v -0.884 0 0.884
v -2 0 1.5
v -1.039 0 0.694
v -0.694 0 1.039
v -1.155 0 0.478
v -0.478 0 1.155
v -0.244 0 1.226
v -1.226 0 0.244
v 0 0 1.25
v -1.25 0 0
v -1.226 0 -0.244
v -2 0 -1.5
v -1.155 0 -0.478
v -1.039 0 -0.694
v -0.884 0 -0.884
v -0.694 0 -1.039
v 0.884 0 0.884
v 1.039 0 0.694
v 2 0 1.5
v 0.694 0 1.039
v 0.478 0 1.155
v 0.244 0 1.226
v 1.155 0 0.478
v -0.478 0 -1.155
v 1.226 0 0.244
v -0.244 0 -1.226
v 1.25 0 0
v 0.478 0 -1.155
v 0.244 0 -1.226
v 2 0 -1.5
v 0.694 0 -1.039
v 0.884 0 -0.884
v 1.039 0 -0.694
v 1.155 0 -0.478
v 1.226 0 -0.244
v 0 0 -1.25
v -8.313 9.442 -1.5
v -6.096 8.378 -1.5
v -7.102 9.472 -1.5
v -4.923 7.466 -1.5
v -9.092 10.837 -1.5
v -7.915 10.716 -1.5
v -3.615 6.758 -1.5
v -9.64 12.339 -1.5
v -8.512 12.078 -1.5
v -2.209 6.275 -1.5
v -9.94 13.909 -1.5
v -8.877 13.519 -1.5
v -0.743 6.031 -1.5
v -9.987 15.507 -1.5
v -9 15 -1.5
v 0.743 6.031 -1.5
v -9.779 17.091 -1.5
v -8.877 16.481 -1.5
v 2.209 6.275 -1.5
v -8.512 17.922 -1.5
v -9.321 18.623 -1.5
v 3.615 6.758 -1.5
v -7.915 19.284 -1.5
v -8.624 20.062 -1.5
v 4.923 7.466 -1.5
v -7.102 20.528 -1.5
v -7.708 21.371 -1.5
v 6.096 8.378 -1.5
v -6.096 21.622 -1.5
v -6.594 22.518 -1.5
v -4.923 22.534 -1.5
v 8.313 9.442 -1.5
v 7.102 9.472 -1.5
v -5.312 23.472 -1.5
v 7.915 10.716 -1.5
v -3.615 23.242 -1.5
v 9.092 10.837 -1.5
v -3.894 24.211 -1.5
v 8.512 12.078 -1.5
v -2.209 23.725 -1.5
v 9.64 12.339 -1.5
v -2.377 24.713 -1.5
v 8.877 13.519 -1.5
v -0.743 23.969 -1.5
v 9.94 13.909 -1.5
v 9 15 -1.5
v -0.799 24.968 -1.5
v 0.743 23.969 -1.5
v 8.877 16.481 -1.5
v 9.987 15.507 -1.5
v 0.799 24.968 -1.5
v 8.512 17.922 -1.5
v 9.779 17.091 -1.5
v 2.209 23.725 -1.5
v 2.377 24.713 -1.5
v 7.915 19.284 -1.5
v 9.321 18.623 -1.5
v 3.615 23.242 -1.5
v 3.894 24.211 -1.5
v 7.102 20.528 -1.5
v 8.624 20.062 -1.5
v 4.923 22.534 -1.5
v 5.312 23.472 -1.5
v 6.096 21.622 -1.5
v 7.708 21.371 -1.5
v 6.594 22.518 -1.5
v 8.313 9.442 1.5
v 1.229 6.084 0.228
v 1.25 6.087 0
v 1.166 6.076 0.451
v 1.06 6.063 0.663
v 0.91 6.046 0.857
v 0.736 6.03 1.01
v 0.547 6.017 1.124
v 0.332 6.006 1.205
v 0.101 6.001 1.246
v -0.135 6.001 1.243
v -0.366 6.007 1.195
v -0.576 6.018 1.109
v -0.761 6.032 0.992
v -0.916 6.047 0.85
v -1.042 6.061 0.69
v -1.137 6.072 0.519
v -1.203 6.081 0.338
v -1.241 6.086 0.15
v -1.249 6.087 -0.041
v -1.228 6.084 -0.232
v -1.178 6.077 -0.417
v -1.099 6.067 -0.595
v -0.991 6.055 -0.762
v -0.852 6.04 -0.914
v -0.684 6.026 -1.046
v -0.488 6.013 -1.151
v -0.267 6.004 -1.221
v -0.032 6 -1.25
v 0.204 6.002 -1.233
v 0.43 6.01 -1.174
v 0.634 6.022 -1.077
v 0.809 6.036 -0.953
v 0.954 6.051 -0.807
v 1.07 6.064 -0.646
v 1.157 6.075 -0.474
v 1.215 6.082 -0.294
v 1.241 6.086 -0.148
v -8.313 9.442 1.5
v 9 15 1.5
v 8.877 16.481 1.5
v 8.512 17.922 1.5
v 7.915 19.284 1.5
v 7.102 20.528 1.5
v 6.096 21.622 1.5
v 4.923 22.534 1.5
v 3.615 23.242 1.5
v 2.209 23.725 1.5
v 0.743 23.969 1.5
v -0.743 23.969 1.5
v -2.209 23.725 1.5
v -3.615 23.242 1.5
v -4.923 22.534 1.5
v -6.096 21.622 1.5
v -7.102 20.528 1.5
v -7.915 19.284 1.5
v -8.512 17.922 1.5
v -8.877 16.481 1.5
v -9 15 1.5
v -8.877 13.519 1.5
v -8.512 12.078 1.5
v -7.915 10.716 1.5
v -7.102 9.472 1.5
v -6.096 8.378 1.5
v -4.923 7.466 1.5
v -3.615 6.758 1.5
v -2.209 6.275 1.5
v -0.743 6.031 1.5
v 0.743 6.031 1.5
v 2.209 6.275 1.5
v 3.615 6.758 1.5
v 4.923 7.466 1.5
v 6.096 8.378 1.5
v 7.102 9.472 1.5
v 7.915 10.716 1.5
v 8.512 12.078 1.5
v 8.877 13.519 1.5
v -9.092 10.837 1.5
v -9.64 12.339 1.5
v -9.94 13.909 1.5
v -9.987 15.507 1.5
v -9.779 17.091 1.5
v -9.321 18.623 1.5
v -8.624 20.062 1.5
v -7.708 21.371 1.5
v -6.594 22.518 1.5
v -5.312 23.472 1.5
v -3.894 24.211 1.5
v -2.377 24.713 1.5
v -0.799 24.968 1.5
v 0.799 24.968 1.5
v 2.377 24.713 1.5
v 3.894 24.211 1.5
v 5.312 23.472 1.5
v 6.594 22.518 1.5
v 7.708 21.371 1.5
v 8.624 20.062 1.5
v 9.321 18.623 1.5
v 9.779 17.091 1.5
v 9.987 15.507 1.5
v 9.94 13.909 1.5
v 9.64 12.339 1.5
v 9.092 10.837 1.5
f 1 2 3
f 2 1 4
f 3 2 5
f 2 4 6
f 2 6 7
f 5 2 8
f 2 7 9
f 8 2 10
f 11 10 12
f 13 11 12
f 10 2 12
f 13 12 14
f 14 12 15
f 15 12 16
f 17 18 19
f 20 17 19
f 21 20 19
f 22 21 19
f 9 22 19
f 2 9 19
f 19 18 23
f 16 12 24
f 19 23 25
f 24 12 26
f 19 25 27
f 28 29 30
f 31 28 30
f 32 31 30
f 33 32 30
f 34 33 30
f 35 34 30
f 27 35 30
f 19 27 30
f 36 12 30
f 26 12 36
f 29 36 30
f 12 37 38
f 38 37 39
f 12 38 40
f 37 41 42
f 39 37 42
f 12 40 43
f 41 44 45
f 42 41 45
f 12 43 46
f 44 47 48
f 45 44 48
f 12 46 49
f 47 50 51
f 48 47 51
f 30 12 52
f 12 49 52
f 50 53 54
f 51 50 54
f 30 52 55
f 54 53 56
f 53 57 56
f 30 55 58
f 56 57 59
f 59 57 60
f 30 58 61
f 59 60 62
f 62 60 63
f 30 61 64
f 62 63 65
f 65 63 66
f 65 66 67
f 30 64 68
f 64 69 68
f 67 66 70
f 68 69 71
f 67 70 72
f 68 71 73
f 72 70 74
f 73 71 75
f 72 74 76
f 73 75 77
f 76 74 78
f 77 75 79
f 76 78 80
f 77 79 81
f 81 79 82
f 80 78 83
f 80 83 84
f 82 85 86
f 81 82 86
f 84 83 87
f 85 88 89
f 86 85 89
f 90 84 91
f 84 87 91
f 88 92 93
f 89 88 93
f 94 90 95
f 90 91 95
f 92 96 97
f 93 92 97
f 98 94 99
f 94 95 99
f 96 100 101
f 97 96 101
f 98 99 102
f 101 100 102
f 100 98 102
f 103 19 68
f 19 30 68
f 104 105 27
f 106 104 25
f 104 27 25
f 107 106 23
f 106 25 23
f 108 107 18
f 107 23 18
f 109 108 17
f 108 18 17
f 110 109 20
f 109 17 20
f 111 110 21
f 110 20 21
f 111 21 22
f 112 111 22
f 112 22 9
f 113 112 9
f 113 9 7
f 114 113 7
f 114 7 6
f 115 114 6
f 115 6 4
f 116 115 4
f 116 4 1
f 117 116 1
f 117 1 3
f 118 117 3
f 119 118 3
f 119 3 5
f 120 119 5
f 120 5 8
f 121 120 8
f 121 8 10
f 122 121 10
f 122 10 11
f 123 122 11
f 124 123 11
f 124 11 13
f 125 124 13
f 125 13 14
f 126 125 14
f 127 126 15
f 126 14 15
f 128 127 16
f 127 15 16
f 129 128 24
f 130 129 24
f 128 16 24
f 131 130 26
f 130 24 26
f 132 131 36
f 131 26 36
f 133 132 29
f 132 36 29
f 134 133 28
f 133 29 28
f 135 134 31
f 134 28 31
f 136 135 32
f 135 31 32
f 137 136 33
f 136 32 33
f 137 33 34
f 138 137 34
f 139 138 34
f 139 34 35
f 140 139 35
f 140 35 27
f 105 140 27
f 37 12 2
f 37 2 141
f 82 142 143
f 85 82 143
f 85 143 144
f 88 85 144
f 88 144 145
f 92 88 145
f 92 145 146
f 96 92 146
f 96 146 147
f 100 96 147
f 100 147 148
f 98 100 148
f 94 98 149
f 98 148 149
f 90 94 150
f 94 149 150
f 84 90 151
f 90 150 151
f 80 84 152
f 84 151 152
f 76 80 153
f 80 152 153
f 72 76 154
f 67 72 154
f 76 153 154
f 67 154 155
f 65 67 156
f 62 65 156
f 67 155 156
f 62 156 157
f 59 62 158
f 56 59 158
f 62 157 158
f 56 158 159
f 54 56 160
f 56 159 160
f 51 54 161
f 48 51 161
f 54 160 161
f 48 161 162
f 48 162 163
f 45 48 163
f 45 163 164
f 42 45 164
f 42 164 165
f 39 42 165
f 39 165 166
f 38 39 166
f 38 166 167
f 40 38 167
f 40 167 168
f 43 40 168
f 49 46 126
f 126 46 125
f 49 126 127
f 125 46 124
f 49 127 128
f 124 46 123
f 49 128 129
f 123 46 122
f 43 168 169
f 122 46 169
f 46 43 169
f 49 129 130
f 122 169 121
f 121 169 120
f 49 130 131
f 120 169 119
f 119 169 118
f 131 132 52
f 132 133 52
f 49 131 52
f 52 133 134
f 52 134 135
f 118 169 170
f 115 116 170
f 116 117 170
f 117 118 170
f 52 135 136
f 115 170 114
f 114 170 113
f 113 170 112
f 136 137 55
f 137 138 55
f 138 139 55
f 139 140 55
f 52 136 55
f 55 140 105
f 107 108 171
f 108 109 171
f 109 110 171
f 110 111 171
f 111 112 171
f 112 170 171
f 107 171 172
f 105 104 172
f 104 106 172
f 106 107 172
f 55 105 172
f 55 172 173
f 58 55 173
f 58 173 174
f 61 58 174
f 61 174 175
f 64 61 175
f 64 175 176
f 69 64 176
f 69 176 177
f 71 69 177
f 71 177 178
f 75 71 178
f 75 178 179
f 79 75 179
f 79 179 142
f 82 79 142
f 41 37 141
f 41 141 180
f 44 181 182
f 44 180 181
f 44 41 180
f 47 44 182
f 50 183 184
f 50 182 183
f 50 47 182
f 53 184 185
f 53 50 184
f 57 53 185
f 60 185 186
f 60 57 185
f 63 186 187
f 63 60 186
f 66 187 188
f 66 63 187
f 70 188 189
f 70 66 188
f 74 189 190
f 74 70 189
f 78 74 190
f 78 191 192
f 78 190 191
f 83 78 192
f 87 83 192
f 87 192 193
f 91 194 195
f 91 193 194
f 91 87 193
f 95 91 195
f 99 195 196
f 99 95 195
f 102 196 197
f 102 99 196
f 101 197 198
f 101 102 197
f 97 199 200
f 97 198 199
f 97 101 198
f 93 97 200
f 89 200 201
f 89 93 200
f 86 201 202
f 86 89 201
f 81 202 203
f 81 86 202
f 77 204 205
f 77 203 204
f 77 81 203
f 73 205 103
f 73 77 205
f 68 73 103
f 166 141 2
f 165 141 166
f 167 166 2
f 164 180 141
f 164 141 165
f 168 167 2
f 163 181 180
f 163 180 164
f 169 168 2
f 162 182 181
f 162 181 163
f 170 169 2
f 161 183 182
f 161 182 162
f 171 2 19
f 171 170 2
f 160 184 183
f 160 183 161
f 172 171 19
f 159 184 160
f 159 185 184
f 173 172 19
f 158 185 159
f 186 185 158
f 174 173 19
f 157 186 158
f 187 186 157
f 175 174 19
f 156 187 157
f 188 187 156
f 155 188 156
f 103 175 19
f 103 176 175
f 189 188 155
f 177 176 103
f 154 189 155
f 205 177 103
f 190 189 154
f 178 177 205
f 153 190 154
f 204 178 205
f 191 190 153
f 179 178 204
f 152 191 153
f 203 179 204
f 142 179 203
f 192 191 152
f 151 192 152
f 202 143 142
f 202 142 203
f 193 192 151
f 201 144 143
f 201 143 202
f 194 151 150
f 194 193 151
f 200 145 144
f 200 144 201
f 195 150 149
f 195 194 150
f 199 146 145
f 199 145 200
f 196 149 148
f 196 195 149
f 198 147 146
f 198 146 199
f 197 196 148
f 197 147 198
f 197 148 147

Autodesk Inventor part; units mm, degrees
ref_plane "YZ Plane" through (0, 0, 0) normal (1, 0, 0) x (0, 1, 0)
ref_plane "XZ Plane" through (0, 0, 0) normal (0, 1, 0) x (-1, 0, 0)
ref_plane "XY Plane" through (0, 0, 0) normal (0, 0, 1) x (1, 0, 0)
sketch "Sketch1" plane through (0, 0, 0) normal (0, 0, 1) x (1, 0, 0)
  line L0 (-2, 0) -> (2, 0)
  arc A0 (8.313, 9.4417) -> (-8.313, 9.4417) centre (0, 15) ccw
  line L1 (-2, 0) -> (-8.313, 9.4417)
  line L2 (2, 0) -> (8.313, 9.4417)
  line L3 (0, 0) -> (0, 7.2801) construction
  point P0 (0, 3.6401)
  dimension "d0" = 20
  dimension "d1" = 4
  dimension "d2" = 15
extrude "Extrusion1" add sketch "Sketch1" along normal mid plane 3
sketch "Sketch2" plane through (0, 0, 1.5) normal (0, 0, 1) x (1, 0, 0)
  circle A0 centre (0, 15) radius 9
  arc A1 (8.313, 9.4417) -> (-8.313, 9.4417) centre (0, 15) ccw projected
  point P0 (0, 0)
  dimension "d5" = 18
extrude "Extrusion2" cut sketch "Sketch2" against normal blind 3
sketch "Sketch3" plane through (-2, 0, 1.5) normal (0, -1, 0) x (1, 0, 0)
  circle A0 centre (2, -1.5) radius 1.25
  dimension "d8" = 2.5
extrude "Extrusion3" cut sketch "Sketch3" against normal up to surface
properties part number "21"
